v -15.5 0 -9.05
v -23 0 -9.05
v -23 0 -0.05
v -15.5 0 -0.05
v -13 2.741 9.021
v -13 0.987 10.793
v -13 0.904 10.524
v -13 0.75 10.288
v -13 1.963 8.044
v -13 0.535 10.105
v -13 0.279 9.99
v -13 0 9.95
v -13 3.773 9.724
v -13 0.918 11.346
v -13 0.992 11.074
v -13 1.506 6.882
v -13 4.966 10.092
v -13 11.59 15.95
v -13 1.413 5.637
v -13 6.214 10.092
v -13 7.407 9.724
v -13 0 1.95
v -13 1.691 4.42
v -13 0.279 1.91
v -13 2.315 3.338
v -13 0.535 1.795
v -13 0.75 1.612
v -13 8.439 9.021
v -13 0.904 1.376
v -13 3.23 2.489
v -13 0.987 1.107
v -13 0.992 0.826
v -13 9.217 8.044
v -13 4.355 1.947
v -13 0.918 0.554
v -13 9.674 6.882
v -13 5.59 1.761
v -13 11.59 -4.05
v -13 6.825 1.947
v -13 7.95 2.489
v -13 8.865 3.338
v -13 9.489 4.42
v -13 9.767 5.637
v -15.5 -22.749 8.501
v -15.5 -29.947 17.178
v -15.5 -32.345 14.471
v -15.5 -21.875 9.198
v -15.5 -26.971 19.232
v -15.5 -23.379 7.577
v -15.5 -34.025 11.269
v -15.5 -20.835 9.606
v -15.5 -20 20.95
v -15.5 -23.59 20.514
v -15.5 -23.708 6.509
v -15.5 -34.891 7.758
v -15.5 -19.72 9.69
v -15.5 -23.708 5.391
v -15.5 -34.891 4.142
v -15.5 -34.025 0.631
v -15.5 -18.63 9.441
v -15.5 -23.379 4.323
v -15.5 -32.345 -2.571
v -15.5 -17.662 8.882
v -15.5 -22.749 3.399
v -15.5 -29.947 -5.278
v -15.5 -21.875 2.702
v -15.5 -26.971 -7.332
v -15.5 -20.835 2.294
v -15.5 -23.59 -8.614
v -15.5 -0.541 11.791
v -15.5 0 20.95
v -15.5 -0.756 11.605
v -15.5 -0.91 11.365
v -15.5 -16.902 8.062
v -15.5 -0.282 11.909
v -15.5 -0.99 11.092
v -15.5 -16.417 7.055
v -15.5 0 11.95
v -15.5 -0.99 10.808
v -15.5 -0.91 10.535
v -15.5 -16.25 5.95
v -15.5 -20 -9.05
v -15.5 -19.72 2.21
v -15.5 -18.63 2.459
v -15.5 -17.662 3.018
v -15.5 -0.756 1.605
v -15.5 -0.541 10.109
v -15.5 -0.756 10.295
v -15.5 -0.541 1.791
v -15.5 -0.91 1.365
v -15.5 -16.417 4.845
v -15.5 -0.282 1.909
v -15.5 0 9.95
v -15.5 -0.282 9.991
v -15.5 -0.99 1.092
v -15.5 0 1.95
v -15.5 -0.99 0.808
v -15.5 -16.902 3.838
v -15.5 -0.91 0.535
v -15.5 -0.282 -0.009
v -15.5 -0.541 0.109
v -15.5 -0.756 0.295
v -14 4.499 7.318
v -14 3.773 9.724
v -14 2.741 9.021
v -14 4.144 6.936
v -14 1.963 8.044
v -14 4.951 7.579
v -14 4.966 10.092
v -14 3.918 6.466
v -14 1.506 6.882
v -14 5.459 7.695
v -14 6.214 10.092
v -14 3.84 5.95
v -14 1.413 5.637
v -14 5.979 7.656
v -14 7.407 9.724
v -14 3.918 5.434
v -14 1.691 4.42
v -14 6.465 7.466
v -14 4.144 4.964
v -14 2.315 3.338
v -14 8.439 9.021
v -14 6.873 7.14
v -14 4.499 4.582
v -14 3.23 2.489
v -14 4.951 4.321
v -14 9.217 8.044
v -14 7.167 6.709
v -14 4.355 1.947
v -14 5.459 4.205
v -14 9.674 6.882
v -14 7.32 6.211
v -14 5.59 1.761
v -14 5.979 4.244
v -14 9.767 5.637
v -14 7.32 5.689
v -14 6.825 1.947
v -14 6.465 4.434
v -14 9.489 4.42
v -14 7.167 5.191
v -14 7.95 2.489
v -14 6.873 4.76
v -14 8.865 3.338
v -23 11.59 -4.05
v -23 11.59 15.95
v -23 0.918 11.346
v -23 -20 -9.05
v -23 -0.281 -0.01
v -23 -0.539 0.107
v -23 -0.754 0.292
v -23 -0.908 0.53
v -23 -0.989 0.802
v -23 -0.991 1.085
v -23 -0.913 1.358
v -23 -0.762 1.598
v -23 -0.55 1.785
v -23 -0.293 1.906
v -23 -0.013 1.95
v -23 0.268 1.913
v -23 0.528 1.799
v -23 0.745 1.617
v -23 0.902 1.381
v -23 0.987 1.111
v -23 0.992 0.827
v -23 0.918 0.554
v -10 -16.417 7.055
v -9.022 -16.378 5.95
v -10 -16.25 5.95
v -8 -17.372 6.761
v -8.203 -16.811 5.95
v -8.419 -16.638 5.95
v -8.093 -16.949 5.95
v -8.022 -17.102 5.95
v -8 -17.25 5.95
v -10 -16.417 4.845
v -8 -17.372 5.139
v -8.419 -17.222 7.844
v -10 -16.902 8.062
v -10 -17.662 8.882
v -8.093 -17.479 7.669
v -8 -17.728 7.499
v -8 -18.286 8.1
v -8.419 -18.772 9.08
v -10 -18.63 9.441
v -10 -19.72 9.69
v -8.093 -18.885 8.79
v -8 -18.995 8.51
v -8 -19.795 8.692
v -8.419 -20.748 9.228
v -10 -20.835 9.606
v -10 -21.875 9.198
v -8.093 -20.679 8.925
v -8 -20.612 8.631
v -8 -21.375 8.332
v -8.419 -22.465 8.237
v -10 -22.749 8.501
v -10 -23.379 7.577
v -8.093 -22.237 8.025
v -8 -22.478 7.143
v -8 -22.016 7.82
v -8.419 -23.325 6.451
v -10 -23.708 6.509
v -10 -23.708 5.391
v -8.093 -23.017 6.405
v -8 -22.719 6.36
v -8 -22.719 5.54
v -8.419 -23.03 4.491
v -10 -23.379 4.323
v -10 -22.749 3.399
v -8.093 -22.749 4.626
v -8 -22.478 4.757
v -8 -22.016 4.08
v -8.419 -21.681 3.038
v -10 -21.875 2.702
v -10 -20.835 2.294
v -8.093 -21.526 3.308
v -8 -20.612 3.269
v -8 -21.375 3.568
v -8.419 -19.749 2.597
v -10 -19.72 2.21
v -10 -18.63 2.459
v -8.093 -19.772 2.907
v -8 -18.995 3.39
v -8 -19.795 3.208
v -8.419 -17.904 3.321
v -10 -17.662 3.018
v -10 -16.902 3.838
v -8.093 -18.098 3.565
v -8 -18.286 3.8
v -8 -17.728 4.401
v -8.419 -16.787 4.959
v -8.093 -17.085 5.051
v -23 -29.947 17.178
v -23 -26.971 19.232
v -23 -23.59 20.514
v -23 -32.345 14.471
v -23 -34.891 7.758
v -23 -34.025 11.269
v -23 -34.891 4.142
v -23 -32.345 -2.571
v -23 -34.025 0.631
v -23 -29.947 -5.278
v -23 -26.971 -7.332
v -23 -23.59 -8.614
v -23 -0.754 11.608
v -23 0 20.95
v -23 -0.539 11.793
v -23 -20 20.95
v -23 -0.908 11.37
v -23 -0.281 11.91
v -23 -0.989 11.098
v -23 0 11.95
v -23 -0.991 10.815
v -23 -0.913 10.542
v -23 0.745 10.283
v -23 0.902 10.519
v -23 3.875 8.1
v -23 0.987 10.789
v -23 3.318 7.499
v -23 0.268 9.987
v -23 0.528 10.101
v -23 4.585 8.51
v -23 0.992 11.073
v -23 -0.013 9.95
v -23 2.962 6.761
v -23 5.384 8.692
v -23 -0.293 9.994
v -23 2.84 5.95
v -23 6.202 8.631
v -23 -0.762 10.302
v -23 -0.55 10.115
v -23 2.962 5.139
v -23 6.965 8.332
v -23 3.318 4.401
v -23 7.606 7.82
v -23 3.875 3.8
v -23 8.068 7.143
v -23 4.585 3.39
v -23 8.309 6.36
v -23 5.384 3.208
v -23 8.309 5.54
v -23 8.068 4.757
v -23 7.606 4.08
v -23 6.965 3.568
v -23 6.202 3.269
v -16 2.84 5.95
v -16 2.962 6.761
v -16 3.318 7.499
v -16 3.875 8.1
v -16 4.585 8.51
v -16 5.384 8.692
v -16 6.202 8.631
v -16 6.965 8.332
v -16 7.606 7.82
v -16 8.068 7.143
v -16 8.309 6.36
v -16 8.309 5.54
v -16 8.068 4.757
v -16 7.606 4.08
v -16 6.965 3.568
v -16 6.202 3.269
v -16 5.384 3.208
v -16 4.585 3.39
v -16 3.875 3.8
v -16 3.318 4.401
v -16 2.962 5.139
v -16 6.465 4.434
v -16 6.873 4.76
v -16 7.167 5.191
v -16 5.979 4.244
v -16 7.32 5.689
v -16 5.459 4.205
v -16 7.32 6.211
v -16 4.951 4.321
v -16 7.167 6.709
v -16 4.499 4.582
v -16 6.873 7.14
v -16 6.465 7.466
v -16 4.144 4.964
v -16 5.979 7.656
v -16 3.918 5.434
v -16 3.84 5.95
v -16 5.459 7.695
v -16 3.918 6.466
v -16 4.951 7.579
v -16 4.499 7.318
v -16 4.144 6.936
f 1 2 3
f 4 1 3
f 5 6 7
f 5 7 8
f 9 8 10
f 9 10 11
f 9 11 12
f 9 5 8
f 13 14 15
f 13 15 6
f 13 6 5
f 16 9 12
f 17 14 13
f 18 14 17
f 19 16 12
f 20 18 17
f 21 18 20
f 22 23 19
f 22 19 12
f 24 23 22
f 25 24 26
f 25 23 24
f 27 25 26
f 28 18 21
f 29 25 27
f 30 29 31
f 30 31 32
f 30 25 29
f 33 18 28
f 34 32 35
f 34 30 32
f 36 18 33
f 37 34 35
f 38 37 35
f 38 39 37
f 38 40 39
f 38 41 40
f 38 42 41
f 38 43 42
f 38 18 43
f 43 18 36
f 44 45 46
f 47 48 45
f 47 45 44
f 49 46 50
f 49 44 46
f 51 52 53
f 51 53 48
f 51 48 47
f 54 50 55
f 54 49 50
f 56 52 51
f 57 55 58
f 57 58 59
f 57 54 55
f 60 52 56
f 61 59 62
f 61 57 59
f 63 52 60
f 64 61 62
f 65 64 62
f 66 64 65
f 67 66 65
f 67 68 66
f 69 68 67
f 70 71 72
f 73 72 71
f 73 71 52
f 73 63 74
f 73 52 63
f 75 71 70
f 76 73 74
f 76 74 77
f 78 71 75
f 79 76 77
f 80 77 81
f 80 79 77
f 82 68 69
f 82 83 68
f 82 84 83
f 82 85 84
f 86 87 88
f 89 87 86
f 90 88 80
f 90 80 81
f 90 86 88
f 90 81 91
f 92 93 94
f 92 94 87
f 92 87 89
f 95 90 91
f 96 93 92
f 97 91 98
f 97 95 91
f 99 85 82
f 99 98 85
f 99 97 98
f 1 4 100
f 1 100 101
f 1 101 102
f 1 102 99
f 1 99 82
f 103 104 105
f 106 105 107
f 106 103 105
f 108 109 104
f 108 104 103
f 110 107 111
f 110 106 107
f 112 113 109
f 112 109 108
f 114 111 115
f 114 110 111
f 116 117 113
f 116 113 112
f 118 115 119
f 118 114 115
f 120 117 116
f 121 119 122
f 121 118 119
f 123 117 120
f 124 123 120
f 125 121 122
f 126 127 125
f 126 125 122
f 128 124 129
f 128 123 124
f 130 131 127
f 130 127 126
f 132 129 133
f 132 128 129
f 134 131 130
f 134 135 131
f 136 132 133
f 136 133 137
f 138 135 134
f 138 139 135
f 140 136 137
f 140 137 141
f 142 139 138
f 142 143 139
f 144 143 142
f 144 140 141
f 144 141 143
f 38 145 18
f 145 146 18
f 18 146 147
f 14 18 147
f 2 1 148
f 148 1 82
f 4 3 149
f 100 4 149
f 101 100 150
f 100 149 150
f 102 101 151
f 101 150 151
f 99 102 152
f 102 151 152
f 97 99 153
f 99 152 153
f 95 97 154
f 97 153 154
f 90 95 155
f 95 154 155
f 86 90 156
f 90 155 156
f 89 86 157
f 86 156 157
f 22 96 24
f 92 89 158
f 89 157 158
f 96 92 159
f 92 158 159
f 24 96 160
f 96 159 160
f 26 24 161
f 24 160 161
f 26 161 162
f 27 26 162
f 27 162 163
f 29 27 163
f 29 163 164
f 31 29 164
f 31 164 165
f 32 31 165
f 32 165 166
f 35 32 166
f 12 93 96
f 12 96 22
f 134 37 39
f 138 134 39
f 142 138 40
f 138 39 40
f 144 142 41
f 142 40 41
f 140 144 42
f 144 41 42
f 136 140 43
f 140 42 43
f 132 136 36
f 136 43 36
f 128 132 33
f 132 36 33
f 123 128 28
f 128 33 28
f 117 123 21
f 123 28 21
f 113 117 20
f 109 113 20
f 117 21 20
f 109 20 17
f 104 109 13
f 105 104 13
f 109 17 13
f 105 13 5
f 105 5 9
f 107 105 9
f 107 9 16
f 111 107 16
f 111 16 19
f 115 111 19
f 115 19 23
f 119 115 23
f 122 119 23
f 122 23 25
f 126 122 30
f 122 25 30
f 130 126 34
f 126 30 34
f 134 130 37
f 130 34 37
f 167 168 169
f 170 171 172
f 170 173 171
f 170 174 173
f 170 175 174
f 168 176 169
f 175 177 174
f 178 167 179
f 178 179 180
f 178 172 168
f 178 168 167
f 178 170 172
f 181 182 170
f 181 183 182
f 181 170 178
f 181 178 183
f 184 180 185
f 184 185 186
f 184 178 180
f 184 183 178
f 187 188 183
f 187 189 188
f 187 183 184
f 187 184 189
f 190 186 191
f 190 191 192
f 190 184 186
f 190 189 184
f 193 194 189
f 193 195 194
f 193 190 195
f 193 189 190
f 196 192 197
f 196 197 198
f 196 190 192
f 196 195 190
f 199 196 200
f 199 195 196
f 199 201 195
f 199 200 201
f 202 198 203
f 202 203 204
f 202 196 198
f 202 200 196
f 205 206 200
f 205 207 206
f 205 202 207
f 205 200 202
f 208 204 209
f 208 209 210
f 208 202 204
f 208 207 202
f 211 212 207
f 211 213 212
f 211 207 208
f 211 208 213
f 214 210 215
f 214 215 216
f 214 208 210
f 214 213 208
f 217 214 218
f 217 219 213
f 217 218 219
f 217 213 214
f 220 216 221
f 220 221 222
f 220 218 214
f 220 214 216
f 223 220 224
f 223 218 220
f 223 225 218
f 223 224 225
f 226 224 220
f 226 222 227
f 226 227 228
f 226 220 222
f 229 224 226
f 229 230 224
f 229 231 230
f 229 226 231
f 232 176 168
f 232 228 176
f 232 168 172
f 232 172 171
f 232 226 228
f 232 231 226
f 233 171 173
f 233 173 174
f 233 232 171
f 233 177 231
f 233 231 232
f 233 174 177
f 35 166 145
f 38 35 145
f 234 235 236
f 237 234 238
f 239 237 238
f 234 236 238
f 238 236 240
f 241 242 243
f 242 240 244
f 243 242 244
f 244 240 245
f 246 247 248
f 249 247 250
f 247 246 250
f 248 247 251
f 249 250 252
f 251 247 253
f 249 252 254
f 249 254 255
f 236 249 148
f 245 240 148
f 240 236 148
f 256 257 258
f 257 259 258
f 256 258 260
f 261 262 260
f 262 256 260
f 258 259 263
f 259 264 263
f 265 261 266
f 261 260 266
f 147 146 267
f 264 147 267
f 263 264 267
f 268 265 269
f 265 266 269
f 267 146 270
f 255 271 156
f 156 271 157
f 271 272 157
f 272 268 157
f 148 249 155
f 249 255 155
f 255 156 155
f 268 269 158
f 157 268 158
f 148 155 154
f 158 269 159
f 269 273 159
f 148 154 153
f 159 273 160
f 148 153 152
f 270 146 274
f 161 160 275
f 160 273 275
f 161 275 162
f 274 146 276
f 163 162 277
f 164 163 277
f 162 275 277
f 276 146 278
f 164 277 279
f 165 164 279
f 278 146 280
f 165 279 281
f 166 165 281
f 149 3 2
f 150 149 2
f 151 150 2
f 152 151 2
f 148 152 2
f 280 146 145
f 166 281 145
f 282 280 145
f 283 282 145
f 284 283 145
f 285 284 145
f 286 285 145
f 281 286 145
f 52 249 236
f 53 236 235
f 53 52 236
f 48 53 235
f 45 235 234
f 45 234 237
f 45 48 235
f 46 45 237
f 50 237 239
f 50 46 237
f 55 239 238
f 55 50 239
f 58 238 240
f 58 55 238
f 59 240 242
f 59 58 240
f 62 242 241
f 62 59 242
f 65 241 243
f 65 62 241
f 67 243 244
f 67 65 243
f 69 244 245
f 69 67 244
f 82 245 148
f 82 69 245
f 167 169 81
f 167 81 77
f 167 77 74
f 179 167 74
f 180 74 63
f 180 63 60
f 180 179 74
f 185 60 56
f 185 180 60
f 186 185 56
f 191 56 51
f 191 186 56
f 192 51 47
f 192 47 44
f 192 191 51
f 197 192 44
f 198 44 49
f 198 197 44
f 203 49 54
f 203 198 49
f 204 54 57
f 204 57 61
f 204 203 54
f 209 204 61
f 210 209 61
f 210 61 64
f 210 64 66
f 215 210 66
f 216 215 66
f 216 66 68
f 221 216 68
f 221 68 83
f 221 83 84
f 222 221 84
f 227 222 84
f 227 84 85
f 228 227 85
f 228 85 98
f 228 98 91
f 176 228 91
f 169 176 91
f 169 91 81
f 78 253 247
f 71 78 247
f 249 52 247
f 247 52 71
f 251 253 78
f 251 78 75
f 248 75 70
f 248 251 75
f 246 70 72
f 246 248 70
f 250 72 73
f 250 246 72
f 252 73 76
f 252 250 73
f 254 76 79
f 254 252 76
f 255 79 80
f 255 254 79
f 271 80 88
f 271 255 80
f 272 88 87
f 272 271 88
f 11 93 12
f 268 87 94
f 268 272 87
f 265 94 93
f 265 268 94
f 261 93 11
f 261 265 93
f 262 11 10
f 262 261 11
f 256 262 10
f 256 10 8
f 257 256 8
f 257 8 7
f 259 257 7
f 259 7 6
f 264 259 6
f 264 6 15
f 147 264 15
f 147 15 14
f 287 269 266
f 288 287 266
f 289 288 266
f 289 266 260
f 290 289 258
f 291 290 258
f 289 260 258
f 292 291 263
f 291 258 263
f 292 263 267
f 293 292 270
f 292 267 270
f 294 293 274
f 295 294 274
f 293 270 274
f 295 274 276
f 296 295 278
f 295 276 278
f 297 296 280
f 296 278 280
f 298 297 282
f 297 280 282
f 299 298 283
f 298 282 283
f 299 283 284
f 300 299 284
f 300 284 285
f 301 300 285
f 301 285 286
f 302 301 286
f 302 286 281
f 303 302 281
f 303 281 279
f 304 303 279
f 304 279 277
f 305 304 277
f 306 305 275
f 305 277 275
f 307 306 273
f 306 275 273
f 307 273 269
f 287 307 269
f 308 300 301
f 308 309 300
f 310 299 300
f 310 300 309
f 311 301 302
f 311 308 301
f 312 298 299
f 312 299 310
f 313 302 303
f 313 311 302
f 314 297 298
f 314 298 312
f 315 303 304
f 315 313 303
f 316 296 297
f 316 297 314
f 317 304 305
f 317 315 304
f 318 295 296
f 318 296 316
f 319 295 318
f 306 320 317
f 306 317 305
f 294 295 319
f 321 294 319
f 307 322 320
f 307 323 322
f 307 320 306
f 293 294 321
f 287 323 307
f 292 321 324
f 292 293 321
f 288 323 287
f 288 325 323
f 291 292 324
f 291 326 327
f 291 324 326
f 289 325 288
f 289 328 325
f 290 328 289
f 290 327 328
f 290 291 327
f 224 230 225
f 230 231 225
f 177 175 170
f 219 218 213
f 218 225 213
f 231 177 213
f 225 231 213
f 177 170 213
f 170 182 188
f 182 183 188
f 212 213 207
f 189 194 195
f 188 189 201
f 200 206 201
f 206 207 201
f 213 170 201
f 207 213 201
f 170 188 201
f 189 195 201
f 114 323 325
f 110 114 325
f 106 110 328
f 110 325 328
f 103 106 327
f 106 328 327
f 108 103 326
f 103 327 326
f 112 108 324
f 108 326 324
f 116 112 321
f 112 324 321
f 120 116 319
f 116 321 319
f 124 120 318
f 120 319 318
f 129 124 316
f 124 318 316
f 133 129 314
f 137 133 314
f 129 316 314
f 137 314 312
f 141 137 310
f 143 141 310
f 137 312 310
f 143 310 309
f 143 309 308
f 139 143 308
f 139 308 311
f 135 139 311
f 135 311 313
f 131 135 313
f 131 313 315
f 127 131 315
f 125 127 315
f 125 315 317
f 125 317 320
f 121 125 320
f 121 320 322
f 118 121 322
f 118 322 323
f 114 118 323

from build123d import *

# Parameters (mm, degrees)
BOSS_EXTRUDE1_DEPTH     = 20.95
BOSS_EXTRUDE2_START     = -9.05
BOSS_EXTRUDE2_DEPTH     = 9.05
SKETCH6_R               = 2
CUT_EXTRUDE2_DEPTH      = 10
CUT_EXTRUDE3_DEPTH      = 2.75
CUT_EXTRUDE4_DEPTH      = 67.499081444
CUT_EXTRUDE4_DEPTH_BACK = 67.499081444
SKETCH8_W               = 8.290514233
SKETCH8_H               = 3.25
SKETCH11_R              = 11.15
BEARING_HOLE_DEPTH      = 7.3
SKETCH9_W               = 12.3
SKETCH9_H               = 21.5
WIRE_HOLE_DEPTH         = 62.274898109
SKETCH12_W              = 46
SKETCH12_H              = 30
BOSS_EXTRUDE3_DEPTH     = 0.0001
BOSS_EXTRUDE4_DEPTH     = 7.5
BOSS_EXTRUDE5_START     = -7.5
BOSS_EXTRUDE5_DEPTH     = 7.5
BOSS_EXTRUDE9_START     = 2.5
BOSS_EXTRUDE9_DEPTH     = 2.5
SKETCH15_R              = 4
CUT_EXTRUDE5_DEPTH      = 77.054456365
SKETCH17_R              = 6.169612062
BOSS_EXTRUDE6_DEPTH     = 10
SKETCH18_R              = 4
KNUB_DEPTH              = 15
SKETCH19_R              = 4.675
CUT_EXTRUDE6_DEPTH      = 2
SKETCH24_R              = 4.5
CUT_EXTRUDE7_DEPTH      = 65.487733972
FILLET1_R               = 0.5
SKETCH25_W              = 8.843315878
SKETCH25_H              = 4.834346013
BOSS_EXTRUDE10_DEPTH    = 2
SKETCH27_W              = 12.3
SKETCH27_H              = 21.5
CUT_EXTRUDE8_DEPTH      = 60.56786481
BOSS_EXTRUDE11_DEPTH    = 14.5901
CUT_EXTRUDE9_REACH      = 69.405
SKETCH29_W              = 15.2
SKETCH29_H              = 3
SKETCH30_W              = 30
SKETCH30_H              = 43.119485767
CUT_EXTRUDE10_DEPTH     = 77.054456365
SKETCH31_W              = 44.37652795
SKETCH31_H              = 54.474735771
CUT_EXTRUDE12_DEPTH     = 64.373176502
SKETCH32_W              = 38.5
SKETCH32_H              = 30
CUT_EXTRUDE13_DEPTH     = 26
SKETCH39_W              = 19.135999949
SKETCH39_H              = 39.276229487
CUT_EXTRUDE18_DEPTH     = 43.013717998
SKETCH33_R              = 2.75
CUT_EXTRUDE14_DEPTH     = 7
SKETCH34_R              = 1.75
CUT_EXTRUDE15_DEPTH     = 10
SKETCH37_R              = 4.188653381
CUT_EXTRUDE17_DEPTH     = 1
SKETCH40_R              = 4
SKETCH40_R_2            = 3.75
CUT_EXTRUDE19_DEPTH     = 7.5
FILLET4_SIZE            = 2
FILLET4_SIZE_2          = 1
CUT_EXTRUDE20_DEPTH     = 44.461586522


with BuildPart() as part:
    # Sketch2 → Boss-Extrude1 (new body)
    with BuildSketch(Plane.XY):
        with BuildLine():
            Line((-14.709485767, 40), (-23, 40))
            Line((-23, 40), (-23, 0))
            Line((-23, 0), (23, 0))
            Line((23, 0), (23, 40))
            Line((23, 40), (14.709485767, 40))
            ThreePointArc((14.709485767, 40), (0, 54.709485767), (-14.709485767, 40))
        make_face()
        with BuildLine():
            Line((-7.65, 18.18111404), (-7.65, 14.59))
            Line((-7.65, 14.59), (7.65, 14.59))
            Line((7.65, 14.59), (7.65, 18.18111404))
            Line((7.65, 18.18111404), (9.45, 18.18111404))
            Line((9.45, 18.18111404), (9.45, 21.20025831))
            ThreePointArc((9.45, 21.20025831), (0, 46.349332344), (-9.45, 21.20025831))
            Line((-9.45, 21.20025831), (-9.45, 18.18111404))
            Line((-9.45, 18.18111404), (-7.65, 18.18111404))
        make_face(mode=Mode.SUBTRACT)
    extrude(amount=BOSS_EXTRUDE1_DEPTH)

    # Sketch3 → Boss-Extrude2 (add)
    with BuildSketch(Plane.XY.offset(BOSS_EXTRUDE2_START)):
        with BuildLine():
            Line((-14.709485767, 40), (-23, 40))
            Line((-23, 40), (-23, 0))
            Line((-23, 0), (23, 0))
            Line((23, 0), (23, 40))
            Line((23, 40), (14.709485767, 40))
            ThreePointArc((14.709485767, 40), (0, 54.709485767), (-14.709485767, 40))
        make_face()
    extrude(amount=BOSS_EXTRUDE2_DEPTH)

    # Sketch6 → Cut-Extrude2 (cut)
    with BuildSketch(Plane.XY.offset(20.95)):
        with Locations((-17.5, 32)):
            Circle(SKETCH6_R)
        with Locations((17.5, 32)):
            Circle(SKETCH6_R)
    extrude(amount=-CUT_EXTRUDE2_DEPTH, mode=Mode.SUBTRACT)

    # Sketch7 → Cut-Extrude3 (cut)
    with BuildSketch(Plane.XY.offset(20.95)):
        with BuildLine():
            Line((-17.5, 35.75), (17.5, 35.75))
            ThreePointArc((17.5, 35.75), (21.25, 32), (17.5, 28.25))
            Line((17.5, 28.25), (-17.5, 28.25))
            ThreePointArc((-17.5, 28.25), (-21.25, 32), (-17.5, 35.75))
        make_face()
    extrude(amount=-CUT_EXTRUDE3_DEPTH, mode=Mode.SUBTRACT)

    # Sketch8 → Cut-Extrude4 (cut, two sides: drawn at the far end of the back side and taken through both)
    with BuildSketch(Plane.XY.offset(20.95).offset(-CUT_EXTRUDE4_DEPTH_BACK)):
        with Locations((-18.854742884, 38.375)):
            Rectangle(SKETCH8_W, SKETCH8_H)
        with Locations((18.854742884, 38.375)):
            Rectangle(SKETCH8_W, SKETCH8_H)
    extrude(amount=CUT_EXTRUDE4_DEPTH + CUT_EXTRUDE4_DEPTH_BACK, mode=Mode.SUBTRACT)

    # Sketch11 → Bearing Hole (cut)
    with BuildSketch(Plane(origin=(0, 0, -9.05), x_dir=(-1, 0, 0), z_dir=(0, 0, -1))):
        with Locations((0, 40)):
            Circle(SKETCH11_R)
    extrude(amount=-BEARING_HOLE_DEPTH, mode=Mode.SUBTRACT)

    # Sketch9 → Wire Hole (cut, through all)
    with BuildSketch(Plane(origin=(0, 14.59, -19.25), x_dir=(-1, 0, 0), z_dir=(0, 1, 0))):
        with Locations((0, 26.95)):
            Rectangle(SKETCH9_W, SKETCH9_H)
    extrude(amount=-WIRE_HOLE_DEPTH, mode=Mode.SUBTRACT)

    # Sketch12 → Boss-Extrude3 (add)
    with BuildSketch(Plane.XZ):
        with Locations((0, 5.95)):
            Rectangle(SKETCH12_W, SKETCH12_H)
    extrude(amount=BOSS_EXTRUDE3_DEPTH)

    # Sketch13 → Boss-Extrude4 (add)
    with BuildSketch(Plane(origin=(23, 0, 0), x_dir=(0, 0, -1), z_dir=(1, 0, 0))):
        with BuildLine():
            Line((-20.95, -0.0001), (-20.95, -20.0001))
            ThreePointArc((-20.95, -20.0001), (-5.95, -35.0001), (9.05, -20.0001))
            Line((9.05, -20.0001), (9.05, -0.0001))
            Line((9.05, -0.0001), (-20.95, -0.0001))
        make_face()
    extrude(amount=-BOSS_EXTRUDE4_DEPTH)

    # Sketch14 → Boss-Extrude5 (add)
    with BuildSketch(Plane.ZY.offset(23).offset(BOSS_EXTRUDE5_START)):
        with BuildLine():
            Line((-9.05, -20.0001), (-9.05, -0.0001))
            Line((-9.05, -0.0001), (20.95, -0.0001))
            Line((20.95, -0.0001), (20.95, -20.0001))
            ThreePointArc((20.95, -20.0001), (5.95, -35.0001), (-9.05, -20.0001))
        make_face()
    extrude(amount=BOSS_EXTRUDE5_DEPTH)

    # Sketch21 → Boss-Extrude9 (add)
    with BuildSketch(Plane(origin=(23, 0, 0), x_dir=(0, 0, -1), z_dir=(1, 0, 0)).offset(BOSS_EXTRUDE9_START)):
        with BuildLine():
            Line((-20.95, -20.0001), (-20.95, 36.75))
            Line((-20.95, 36.75), (9.05, 36.75))
            Line((9.05, 36.75), (9.05, -20.0001))
            ThreePointArc((9.05, -20.0001), (-5.95, -35.0001), (-20.95, -20.0001))
        make_face()
    extrude(amount=-BOSS_EXTRUDE9_DEPTH)

    # Sketch15 → Cut-Extrude5 (cut, through all)
    with BuildSketch(Plane.ZY.offset(23)):
        with Locations(Location((5.95, -20.0001, 0), (0, 0, 270))):
            Circle(SKETCH15_R)
    extrude(amount=-CUT_EXTRUDE5_DEPTH, mode=Mode.SUBTRACT)

    # Sketch17 → Boss-Extrude6 (add)
    with BuildSketch(Plane(origin=(25.5, 0, -23), x_dir=(0, 0, 1), z_dir=(-1, 0, 0))):
        with Locations((28.95, -20.0001)):
            Circle(SKETCH17_R)
        with BuildLine():
            Line((26.765394773, -18.5001), (31.134605227, -18.5001))
            ThreePointArc((31.134605227, -18.5001), (31.6, -20.0001), (31.134605227, -21.5001))
            Line((31.134605227, -21.5001), (26.765394773, -21.5001))
            ThreePointArc((26.765394773, -21.5001), (26.3, -20.0001), (26.765394773, -18.5001))
        make_face(mode=Mode.SUBTRACT)
    extrude(amount=BOSS_EXTRUDE6_DEPTH)

    # Sketch18 → Knub (add)
    with BuildSketch(Plane.ZY.offset(23)):
        with Locations(Location((5.95, -20.0001, 0), (0, 0, 270))):
            Circle(SKETCH18_R)
    extrude(amount=-KNUB_DEPTH)

    # Sketch19 → Cut-Extrude6 (cut)
    with BuildSketch(Plane.ZY.offset(-15.5)):
        with Locations((5.95, -20.0001)):
            Circle(SKETCH19_R)
    extrude(amount=-CUT_EXTRUDE6_DEPTH, mode=Mode.SUBTRACT)

    # Sketch24 → Cut-Extrude7 (cut, through all)
    with BuildSketch(Plane(origin=(0, 0, -1.75), x_dir=(-1, 0, 0), z_dir=(0, 0, -1))):
        with Locations((0, 40)):
            Circle(SKETCH24_R)
    extrude(amount=-CUT_EXTRUDE7_DEPTH, mode=Mode.SUBTRACT)

    # Fillet1
    fillet1_edges = [part.edges().sort_by_distance(p)[0] for p in [
        (11.15, 40, -9.05),
    ]]
    fillet(fillet1_edges, radius=FILLET1_R)

    # Sketch25 → Boss-Extrude10 (add)
    with BuildSketch(Plane(origin=(25.5, 0, 0), x_dir=(0, 0, -1), z_dir=(1, 0, 0))):
        with Locations((-6.185865257, -20.38943492)):
            Rectangle(SKETCH25_W, SKETCH25_H)
    extrude(amount=-BOSS_EXTRUDE10_DEPTH)

    # Sketch27 → Cut-Extrude8 (cut, through all)
    with BuildSketch(Plane(origin=(0, 14.59, 0), x_dir=(1, 0, 0), z_dir=(0, 1, 0))):
        with Locations((0, -7.7)):
            Rectangle(SKETCH27_W, SKETCH27_H)
    extrude(amount=-CUT_EXTRUDE8_DEPTH, mode=Mode.SUBTRACT)

    # Sketch28 → Boss-Extrude11 (add)
    with BuildSketch(Plane.XZ.offset(0.0001)):
        Polygon((-6.15, 7.7), (0, 17.95), (6.15, 7.7), (6.15, 18.45), (-6.15, 18.45), align=None)
    extrude(amount=-BOSS_EXTRUDE11_DEPTH)

    # Cut-Extrude9: up to this face of the body (flat: up to its plane)
    cut_extrude9_end = Plane(part.part.faces().sort_by_distance((0, 29.679084048, 0))[0])
    # Sketch29 → Cut-Extrude9 (cut, up to the picked face)
    with BuildSketch(Plane.XY.offset(20.95), mode=Mode.PRIVATE) as cut_extrude9_sk1:
        with Locations((-0.05, 13.09)):
            Rectangle(SKETCH29_W, SKETCH29_H)
    cut_extrude9_tool1 = split(extrude(cut_extrude9_sk1.sketch, amount=-CUT_EXTRUDE9_REACH, mode=Mode.PRIVATE), bisect_by=cut_extrude9_end, keep=Keep.BOTH, mode=Mode.PRIVATE)
    add(cut_extrude9_tool1.solids().sort_by(Axis((-0.05, 13.09, 20.95), (0, 0, -1)))[0], mode=Mode.SUBTRACT)

    # Sketch30 → Cut-Extrude10 (cut, through all)
    with BuildSketch(Plane.ZY.offset(23)):
        with Locations((5.95, 33.149742884)):
            Rectangle(SKETCH30_W, SKETCH30_H)
    extrude(amount=-CUT_EXTRUDE10_DEPTH, mode=Mode.SUBTRACT)

    # Sketch31 → Cut-Extrude12 (cut, through all)
    with BuildSketch(Plane.ZY.offset(23)):
        with Locations((5.76471192, -10.040592917)):
            Rectangle(SKETCH31_W, SKETCH31_H)
        with BuildLine():
            Line((-4.05, 11.59), (15.95, 11.59))
            Line((15.95, 11.59), (10.95, -0.0001))
            Line((10.95, -0.0001), (20.95, -0.0001))
            Line((20.95, -0.0001), (20.95, -20.0001))
            ThreePointArc((20.95, -20.0001), (5.95, -35.0001), (-9.05, -20.0001))
            Line((-9.05, -20.0001), (-9.05, -0.0001))
            Line((-9.05, -0.0001), (0.95, -0.0001))
            Line((0.95, -0.0001), (-4.05, 11.59))
        make_face(mode=Mode.SUBTRACT)
    extrude(amount=-CUT_EXTRUDE12_DEPTH, mode=Mode.SUBTRACT)

    # Sketch32 → Cut-Extrude13 (cut)
    with BuildSketch(Plane(origin=(0, 11.59, 0), x_dir=(1, 0, 0), z_dir=(0, 1, 0))):
        with Locations((6.25, -5.95)):
            Rectangle(SKETCH32_W, SKETCH32_H)
    extrude(amount=-CUT_EXTRUDE13_DEPTH, mode=Mode.SUBTRACT)


with BuildPart() as cut_extrude13_piece_1:
    # of the separate pieces the step leaves, piece 1, a body of its own (cut_extrude13_pieces)
    add(part.part.solids().sort_by_distance((-23, -0.0001, 0.95))[0])

    # Sketch33 → Cut-Extrude14 (cut)
    with BuildSketch(Plane.ZY.offset(23)):
        with Locations(Location((5.95, 5.59, 0), (0, 0, 270))):
            Circle(SKETCH33_R)
    extrude(amount=-CUT_EXTRUDE14_DEPTH, mode=Mode.SUBTRACT)

    # Sketch34 → Cut-Extrude15 (cut)
    with BuildSketch(Plane.ZY.offset(16)):
        with Locations(Location((5.95, 5.59, 0), (0, 0, 270))):
            Circle(SKETCH34_R)
    extrude(amount=-CUT_EXTRUDE15_DEPTH, mode=Mode.SUBTRACT)

    # Sketch37 → Cut-Extrude17 (cut)
    with BuildSketch(Plane(origin=(-13, 0, 0), x_dir=(0, 0, -1), z_dir=(1, 0, 0))):
        with Locations((-5.95, 5.59)):
            Circle(SKETCH37_R)
    extrude(amount=-CUT_EXTRUDE17_DEPTH, mode=Mode.SUBTRACT)

    # Sketch40 → Cut-Extrude19 (cut)
    with BuildSketch(Plane(origin=(-8, 0, 0), x_dir=(0, 0, -1), z_dir=(1, 0, 0))):
        with Locations((-5.95, -20.0001)):
            Circle(SKETCH40_R)
        with Locations(Location((-5.95, -20.0001, 0), (0, 0, 90))):
            Circle(SKETCH40_R_2, mode=Mode.SUBTRACT)
    extrude(amount=-CUT_EXTRUDE19_DEPTH, mode=Mode.SUBTRACT)

    # Fillet4
    # an asymmetric fillet: 2, 1 mm, written as the material it takes off along each edge
    with BuildSketch(Plane(origin=(-8, -20.0001, 5.95), x_dir=(0, 1, 0), z_dir=(0, 0, -1))) as fillet4_piece_1:
        with BuildLine():
            Bezier((3.75, -FILLET4_SIZE), (3.75, 0), (3.75 - FILLET4_SIZE_2, 0), weights=[1, 0.707106781, 1])
            Line((3.75 - FILLET4_SIZE_2, 0), (3.75, 0))
            Line((3.75, 0), (3.75, -FILLET4_SIZE))
        make_face()
    revolve(axis=Axis((-8, -20.0001, 5.95), (1, 0, 0)), mode=Mode.SUBTRACT)

    # Sketch41 → Cut-Extrude20 (cut, through all)
    with BuildSketch(Plane.ZY.offset(23)):
        with BuildLine():
            Line((0.553885576, 0.918101156), (0.95, -0.0001))
            Line((0.95, -0.0001), (-0.05, -0.0001))
            ThreePointArc((-0.05, -0.0001), (1.785498182, -0.54959321), (0.553885576, 0.918101156))
        make_face()
        with BuildLine():
            Line((11.346114424, 0.918101156), (10.95, -0.0001))
            Line((10.95, -0.0001), (11.95, -0.0001))
            ThreePointArc((11.95, -0.0001), (10.114501818, -0.54959321), (11.346114424, 0.918101156))
        make_face()
    extrude(amount=-CUT_EXTRUDE20_DEPTH, mode=Mode.SUBTRACT)


with BuildPart() as cut_extrude13_piece_2:
    # of the separate pieces the step leaves, piece 2, a body of its own (cut_extrude13_pieces)
    add(part.part.solids().sort_by_distance((25.5, -14.41, -9.05))[0])

    # Sketch39 → Cut-Extrude18 (cut, through all)
    with BuildSketch(Plane(origin=(0, -14.41, 0), x_dir=(1, 0, 0), z_dir=(0, 1, 0))):
        with Locations((22.531610438, -7.15409506)):
            Rectangle(SKETCH39_W, SKETCH39_H)
    extrude(amount=-CUT_EXTRUDE18_DEPTH, mode=Mode.SUBTRACT)


solid = cut_extrude13_piece_1.part
